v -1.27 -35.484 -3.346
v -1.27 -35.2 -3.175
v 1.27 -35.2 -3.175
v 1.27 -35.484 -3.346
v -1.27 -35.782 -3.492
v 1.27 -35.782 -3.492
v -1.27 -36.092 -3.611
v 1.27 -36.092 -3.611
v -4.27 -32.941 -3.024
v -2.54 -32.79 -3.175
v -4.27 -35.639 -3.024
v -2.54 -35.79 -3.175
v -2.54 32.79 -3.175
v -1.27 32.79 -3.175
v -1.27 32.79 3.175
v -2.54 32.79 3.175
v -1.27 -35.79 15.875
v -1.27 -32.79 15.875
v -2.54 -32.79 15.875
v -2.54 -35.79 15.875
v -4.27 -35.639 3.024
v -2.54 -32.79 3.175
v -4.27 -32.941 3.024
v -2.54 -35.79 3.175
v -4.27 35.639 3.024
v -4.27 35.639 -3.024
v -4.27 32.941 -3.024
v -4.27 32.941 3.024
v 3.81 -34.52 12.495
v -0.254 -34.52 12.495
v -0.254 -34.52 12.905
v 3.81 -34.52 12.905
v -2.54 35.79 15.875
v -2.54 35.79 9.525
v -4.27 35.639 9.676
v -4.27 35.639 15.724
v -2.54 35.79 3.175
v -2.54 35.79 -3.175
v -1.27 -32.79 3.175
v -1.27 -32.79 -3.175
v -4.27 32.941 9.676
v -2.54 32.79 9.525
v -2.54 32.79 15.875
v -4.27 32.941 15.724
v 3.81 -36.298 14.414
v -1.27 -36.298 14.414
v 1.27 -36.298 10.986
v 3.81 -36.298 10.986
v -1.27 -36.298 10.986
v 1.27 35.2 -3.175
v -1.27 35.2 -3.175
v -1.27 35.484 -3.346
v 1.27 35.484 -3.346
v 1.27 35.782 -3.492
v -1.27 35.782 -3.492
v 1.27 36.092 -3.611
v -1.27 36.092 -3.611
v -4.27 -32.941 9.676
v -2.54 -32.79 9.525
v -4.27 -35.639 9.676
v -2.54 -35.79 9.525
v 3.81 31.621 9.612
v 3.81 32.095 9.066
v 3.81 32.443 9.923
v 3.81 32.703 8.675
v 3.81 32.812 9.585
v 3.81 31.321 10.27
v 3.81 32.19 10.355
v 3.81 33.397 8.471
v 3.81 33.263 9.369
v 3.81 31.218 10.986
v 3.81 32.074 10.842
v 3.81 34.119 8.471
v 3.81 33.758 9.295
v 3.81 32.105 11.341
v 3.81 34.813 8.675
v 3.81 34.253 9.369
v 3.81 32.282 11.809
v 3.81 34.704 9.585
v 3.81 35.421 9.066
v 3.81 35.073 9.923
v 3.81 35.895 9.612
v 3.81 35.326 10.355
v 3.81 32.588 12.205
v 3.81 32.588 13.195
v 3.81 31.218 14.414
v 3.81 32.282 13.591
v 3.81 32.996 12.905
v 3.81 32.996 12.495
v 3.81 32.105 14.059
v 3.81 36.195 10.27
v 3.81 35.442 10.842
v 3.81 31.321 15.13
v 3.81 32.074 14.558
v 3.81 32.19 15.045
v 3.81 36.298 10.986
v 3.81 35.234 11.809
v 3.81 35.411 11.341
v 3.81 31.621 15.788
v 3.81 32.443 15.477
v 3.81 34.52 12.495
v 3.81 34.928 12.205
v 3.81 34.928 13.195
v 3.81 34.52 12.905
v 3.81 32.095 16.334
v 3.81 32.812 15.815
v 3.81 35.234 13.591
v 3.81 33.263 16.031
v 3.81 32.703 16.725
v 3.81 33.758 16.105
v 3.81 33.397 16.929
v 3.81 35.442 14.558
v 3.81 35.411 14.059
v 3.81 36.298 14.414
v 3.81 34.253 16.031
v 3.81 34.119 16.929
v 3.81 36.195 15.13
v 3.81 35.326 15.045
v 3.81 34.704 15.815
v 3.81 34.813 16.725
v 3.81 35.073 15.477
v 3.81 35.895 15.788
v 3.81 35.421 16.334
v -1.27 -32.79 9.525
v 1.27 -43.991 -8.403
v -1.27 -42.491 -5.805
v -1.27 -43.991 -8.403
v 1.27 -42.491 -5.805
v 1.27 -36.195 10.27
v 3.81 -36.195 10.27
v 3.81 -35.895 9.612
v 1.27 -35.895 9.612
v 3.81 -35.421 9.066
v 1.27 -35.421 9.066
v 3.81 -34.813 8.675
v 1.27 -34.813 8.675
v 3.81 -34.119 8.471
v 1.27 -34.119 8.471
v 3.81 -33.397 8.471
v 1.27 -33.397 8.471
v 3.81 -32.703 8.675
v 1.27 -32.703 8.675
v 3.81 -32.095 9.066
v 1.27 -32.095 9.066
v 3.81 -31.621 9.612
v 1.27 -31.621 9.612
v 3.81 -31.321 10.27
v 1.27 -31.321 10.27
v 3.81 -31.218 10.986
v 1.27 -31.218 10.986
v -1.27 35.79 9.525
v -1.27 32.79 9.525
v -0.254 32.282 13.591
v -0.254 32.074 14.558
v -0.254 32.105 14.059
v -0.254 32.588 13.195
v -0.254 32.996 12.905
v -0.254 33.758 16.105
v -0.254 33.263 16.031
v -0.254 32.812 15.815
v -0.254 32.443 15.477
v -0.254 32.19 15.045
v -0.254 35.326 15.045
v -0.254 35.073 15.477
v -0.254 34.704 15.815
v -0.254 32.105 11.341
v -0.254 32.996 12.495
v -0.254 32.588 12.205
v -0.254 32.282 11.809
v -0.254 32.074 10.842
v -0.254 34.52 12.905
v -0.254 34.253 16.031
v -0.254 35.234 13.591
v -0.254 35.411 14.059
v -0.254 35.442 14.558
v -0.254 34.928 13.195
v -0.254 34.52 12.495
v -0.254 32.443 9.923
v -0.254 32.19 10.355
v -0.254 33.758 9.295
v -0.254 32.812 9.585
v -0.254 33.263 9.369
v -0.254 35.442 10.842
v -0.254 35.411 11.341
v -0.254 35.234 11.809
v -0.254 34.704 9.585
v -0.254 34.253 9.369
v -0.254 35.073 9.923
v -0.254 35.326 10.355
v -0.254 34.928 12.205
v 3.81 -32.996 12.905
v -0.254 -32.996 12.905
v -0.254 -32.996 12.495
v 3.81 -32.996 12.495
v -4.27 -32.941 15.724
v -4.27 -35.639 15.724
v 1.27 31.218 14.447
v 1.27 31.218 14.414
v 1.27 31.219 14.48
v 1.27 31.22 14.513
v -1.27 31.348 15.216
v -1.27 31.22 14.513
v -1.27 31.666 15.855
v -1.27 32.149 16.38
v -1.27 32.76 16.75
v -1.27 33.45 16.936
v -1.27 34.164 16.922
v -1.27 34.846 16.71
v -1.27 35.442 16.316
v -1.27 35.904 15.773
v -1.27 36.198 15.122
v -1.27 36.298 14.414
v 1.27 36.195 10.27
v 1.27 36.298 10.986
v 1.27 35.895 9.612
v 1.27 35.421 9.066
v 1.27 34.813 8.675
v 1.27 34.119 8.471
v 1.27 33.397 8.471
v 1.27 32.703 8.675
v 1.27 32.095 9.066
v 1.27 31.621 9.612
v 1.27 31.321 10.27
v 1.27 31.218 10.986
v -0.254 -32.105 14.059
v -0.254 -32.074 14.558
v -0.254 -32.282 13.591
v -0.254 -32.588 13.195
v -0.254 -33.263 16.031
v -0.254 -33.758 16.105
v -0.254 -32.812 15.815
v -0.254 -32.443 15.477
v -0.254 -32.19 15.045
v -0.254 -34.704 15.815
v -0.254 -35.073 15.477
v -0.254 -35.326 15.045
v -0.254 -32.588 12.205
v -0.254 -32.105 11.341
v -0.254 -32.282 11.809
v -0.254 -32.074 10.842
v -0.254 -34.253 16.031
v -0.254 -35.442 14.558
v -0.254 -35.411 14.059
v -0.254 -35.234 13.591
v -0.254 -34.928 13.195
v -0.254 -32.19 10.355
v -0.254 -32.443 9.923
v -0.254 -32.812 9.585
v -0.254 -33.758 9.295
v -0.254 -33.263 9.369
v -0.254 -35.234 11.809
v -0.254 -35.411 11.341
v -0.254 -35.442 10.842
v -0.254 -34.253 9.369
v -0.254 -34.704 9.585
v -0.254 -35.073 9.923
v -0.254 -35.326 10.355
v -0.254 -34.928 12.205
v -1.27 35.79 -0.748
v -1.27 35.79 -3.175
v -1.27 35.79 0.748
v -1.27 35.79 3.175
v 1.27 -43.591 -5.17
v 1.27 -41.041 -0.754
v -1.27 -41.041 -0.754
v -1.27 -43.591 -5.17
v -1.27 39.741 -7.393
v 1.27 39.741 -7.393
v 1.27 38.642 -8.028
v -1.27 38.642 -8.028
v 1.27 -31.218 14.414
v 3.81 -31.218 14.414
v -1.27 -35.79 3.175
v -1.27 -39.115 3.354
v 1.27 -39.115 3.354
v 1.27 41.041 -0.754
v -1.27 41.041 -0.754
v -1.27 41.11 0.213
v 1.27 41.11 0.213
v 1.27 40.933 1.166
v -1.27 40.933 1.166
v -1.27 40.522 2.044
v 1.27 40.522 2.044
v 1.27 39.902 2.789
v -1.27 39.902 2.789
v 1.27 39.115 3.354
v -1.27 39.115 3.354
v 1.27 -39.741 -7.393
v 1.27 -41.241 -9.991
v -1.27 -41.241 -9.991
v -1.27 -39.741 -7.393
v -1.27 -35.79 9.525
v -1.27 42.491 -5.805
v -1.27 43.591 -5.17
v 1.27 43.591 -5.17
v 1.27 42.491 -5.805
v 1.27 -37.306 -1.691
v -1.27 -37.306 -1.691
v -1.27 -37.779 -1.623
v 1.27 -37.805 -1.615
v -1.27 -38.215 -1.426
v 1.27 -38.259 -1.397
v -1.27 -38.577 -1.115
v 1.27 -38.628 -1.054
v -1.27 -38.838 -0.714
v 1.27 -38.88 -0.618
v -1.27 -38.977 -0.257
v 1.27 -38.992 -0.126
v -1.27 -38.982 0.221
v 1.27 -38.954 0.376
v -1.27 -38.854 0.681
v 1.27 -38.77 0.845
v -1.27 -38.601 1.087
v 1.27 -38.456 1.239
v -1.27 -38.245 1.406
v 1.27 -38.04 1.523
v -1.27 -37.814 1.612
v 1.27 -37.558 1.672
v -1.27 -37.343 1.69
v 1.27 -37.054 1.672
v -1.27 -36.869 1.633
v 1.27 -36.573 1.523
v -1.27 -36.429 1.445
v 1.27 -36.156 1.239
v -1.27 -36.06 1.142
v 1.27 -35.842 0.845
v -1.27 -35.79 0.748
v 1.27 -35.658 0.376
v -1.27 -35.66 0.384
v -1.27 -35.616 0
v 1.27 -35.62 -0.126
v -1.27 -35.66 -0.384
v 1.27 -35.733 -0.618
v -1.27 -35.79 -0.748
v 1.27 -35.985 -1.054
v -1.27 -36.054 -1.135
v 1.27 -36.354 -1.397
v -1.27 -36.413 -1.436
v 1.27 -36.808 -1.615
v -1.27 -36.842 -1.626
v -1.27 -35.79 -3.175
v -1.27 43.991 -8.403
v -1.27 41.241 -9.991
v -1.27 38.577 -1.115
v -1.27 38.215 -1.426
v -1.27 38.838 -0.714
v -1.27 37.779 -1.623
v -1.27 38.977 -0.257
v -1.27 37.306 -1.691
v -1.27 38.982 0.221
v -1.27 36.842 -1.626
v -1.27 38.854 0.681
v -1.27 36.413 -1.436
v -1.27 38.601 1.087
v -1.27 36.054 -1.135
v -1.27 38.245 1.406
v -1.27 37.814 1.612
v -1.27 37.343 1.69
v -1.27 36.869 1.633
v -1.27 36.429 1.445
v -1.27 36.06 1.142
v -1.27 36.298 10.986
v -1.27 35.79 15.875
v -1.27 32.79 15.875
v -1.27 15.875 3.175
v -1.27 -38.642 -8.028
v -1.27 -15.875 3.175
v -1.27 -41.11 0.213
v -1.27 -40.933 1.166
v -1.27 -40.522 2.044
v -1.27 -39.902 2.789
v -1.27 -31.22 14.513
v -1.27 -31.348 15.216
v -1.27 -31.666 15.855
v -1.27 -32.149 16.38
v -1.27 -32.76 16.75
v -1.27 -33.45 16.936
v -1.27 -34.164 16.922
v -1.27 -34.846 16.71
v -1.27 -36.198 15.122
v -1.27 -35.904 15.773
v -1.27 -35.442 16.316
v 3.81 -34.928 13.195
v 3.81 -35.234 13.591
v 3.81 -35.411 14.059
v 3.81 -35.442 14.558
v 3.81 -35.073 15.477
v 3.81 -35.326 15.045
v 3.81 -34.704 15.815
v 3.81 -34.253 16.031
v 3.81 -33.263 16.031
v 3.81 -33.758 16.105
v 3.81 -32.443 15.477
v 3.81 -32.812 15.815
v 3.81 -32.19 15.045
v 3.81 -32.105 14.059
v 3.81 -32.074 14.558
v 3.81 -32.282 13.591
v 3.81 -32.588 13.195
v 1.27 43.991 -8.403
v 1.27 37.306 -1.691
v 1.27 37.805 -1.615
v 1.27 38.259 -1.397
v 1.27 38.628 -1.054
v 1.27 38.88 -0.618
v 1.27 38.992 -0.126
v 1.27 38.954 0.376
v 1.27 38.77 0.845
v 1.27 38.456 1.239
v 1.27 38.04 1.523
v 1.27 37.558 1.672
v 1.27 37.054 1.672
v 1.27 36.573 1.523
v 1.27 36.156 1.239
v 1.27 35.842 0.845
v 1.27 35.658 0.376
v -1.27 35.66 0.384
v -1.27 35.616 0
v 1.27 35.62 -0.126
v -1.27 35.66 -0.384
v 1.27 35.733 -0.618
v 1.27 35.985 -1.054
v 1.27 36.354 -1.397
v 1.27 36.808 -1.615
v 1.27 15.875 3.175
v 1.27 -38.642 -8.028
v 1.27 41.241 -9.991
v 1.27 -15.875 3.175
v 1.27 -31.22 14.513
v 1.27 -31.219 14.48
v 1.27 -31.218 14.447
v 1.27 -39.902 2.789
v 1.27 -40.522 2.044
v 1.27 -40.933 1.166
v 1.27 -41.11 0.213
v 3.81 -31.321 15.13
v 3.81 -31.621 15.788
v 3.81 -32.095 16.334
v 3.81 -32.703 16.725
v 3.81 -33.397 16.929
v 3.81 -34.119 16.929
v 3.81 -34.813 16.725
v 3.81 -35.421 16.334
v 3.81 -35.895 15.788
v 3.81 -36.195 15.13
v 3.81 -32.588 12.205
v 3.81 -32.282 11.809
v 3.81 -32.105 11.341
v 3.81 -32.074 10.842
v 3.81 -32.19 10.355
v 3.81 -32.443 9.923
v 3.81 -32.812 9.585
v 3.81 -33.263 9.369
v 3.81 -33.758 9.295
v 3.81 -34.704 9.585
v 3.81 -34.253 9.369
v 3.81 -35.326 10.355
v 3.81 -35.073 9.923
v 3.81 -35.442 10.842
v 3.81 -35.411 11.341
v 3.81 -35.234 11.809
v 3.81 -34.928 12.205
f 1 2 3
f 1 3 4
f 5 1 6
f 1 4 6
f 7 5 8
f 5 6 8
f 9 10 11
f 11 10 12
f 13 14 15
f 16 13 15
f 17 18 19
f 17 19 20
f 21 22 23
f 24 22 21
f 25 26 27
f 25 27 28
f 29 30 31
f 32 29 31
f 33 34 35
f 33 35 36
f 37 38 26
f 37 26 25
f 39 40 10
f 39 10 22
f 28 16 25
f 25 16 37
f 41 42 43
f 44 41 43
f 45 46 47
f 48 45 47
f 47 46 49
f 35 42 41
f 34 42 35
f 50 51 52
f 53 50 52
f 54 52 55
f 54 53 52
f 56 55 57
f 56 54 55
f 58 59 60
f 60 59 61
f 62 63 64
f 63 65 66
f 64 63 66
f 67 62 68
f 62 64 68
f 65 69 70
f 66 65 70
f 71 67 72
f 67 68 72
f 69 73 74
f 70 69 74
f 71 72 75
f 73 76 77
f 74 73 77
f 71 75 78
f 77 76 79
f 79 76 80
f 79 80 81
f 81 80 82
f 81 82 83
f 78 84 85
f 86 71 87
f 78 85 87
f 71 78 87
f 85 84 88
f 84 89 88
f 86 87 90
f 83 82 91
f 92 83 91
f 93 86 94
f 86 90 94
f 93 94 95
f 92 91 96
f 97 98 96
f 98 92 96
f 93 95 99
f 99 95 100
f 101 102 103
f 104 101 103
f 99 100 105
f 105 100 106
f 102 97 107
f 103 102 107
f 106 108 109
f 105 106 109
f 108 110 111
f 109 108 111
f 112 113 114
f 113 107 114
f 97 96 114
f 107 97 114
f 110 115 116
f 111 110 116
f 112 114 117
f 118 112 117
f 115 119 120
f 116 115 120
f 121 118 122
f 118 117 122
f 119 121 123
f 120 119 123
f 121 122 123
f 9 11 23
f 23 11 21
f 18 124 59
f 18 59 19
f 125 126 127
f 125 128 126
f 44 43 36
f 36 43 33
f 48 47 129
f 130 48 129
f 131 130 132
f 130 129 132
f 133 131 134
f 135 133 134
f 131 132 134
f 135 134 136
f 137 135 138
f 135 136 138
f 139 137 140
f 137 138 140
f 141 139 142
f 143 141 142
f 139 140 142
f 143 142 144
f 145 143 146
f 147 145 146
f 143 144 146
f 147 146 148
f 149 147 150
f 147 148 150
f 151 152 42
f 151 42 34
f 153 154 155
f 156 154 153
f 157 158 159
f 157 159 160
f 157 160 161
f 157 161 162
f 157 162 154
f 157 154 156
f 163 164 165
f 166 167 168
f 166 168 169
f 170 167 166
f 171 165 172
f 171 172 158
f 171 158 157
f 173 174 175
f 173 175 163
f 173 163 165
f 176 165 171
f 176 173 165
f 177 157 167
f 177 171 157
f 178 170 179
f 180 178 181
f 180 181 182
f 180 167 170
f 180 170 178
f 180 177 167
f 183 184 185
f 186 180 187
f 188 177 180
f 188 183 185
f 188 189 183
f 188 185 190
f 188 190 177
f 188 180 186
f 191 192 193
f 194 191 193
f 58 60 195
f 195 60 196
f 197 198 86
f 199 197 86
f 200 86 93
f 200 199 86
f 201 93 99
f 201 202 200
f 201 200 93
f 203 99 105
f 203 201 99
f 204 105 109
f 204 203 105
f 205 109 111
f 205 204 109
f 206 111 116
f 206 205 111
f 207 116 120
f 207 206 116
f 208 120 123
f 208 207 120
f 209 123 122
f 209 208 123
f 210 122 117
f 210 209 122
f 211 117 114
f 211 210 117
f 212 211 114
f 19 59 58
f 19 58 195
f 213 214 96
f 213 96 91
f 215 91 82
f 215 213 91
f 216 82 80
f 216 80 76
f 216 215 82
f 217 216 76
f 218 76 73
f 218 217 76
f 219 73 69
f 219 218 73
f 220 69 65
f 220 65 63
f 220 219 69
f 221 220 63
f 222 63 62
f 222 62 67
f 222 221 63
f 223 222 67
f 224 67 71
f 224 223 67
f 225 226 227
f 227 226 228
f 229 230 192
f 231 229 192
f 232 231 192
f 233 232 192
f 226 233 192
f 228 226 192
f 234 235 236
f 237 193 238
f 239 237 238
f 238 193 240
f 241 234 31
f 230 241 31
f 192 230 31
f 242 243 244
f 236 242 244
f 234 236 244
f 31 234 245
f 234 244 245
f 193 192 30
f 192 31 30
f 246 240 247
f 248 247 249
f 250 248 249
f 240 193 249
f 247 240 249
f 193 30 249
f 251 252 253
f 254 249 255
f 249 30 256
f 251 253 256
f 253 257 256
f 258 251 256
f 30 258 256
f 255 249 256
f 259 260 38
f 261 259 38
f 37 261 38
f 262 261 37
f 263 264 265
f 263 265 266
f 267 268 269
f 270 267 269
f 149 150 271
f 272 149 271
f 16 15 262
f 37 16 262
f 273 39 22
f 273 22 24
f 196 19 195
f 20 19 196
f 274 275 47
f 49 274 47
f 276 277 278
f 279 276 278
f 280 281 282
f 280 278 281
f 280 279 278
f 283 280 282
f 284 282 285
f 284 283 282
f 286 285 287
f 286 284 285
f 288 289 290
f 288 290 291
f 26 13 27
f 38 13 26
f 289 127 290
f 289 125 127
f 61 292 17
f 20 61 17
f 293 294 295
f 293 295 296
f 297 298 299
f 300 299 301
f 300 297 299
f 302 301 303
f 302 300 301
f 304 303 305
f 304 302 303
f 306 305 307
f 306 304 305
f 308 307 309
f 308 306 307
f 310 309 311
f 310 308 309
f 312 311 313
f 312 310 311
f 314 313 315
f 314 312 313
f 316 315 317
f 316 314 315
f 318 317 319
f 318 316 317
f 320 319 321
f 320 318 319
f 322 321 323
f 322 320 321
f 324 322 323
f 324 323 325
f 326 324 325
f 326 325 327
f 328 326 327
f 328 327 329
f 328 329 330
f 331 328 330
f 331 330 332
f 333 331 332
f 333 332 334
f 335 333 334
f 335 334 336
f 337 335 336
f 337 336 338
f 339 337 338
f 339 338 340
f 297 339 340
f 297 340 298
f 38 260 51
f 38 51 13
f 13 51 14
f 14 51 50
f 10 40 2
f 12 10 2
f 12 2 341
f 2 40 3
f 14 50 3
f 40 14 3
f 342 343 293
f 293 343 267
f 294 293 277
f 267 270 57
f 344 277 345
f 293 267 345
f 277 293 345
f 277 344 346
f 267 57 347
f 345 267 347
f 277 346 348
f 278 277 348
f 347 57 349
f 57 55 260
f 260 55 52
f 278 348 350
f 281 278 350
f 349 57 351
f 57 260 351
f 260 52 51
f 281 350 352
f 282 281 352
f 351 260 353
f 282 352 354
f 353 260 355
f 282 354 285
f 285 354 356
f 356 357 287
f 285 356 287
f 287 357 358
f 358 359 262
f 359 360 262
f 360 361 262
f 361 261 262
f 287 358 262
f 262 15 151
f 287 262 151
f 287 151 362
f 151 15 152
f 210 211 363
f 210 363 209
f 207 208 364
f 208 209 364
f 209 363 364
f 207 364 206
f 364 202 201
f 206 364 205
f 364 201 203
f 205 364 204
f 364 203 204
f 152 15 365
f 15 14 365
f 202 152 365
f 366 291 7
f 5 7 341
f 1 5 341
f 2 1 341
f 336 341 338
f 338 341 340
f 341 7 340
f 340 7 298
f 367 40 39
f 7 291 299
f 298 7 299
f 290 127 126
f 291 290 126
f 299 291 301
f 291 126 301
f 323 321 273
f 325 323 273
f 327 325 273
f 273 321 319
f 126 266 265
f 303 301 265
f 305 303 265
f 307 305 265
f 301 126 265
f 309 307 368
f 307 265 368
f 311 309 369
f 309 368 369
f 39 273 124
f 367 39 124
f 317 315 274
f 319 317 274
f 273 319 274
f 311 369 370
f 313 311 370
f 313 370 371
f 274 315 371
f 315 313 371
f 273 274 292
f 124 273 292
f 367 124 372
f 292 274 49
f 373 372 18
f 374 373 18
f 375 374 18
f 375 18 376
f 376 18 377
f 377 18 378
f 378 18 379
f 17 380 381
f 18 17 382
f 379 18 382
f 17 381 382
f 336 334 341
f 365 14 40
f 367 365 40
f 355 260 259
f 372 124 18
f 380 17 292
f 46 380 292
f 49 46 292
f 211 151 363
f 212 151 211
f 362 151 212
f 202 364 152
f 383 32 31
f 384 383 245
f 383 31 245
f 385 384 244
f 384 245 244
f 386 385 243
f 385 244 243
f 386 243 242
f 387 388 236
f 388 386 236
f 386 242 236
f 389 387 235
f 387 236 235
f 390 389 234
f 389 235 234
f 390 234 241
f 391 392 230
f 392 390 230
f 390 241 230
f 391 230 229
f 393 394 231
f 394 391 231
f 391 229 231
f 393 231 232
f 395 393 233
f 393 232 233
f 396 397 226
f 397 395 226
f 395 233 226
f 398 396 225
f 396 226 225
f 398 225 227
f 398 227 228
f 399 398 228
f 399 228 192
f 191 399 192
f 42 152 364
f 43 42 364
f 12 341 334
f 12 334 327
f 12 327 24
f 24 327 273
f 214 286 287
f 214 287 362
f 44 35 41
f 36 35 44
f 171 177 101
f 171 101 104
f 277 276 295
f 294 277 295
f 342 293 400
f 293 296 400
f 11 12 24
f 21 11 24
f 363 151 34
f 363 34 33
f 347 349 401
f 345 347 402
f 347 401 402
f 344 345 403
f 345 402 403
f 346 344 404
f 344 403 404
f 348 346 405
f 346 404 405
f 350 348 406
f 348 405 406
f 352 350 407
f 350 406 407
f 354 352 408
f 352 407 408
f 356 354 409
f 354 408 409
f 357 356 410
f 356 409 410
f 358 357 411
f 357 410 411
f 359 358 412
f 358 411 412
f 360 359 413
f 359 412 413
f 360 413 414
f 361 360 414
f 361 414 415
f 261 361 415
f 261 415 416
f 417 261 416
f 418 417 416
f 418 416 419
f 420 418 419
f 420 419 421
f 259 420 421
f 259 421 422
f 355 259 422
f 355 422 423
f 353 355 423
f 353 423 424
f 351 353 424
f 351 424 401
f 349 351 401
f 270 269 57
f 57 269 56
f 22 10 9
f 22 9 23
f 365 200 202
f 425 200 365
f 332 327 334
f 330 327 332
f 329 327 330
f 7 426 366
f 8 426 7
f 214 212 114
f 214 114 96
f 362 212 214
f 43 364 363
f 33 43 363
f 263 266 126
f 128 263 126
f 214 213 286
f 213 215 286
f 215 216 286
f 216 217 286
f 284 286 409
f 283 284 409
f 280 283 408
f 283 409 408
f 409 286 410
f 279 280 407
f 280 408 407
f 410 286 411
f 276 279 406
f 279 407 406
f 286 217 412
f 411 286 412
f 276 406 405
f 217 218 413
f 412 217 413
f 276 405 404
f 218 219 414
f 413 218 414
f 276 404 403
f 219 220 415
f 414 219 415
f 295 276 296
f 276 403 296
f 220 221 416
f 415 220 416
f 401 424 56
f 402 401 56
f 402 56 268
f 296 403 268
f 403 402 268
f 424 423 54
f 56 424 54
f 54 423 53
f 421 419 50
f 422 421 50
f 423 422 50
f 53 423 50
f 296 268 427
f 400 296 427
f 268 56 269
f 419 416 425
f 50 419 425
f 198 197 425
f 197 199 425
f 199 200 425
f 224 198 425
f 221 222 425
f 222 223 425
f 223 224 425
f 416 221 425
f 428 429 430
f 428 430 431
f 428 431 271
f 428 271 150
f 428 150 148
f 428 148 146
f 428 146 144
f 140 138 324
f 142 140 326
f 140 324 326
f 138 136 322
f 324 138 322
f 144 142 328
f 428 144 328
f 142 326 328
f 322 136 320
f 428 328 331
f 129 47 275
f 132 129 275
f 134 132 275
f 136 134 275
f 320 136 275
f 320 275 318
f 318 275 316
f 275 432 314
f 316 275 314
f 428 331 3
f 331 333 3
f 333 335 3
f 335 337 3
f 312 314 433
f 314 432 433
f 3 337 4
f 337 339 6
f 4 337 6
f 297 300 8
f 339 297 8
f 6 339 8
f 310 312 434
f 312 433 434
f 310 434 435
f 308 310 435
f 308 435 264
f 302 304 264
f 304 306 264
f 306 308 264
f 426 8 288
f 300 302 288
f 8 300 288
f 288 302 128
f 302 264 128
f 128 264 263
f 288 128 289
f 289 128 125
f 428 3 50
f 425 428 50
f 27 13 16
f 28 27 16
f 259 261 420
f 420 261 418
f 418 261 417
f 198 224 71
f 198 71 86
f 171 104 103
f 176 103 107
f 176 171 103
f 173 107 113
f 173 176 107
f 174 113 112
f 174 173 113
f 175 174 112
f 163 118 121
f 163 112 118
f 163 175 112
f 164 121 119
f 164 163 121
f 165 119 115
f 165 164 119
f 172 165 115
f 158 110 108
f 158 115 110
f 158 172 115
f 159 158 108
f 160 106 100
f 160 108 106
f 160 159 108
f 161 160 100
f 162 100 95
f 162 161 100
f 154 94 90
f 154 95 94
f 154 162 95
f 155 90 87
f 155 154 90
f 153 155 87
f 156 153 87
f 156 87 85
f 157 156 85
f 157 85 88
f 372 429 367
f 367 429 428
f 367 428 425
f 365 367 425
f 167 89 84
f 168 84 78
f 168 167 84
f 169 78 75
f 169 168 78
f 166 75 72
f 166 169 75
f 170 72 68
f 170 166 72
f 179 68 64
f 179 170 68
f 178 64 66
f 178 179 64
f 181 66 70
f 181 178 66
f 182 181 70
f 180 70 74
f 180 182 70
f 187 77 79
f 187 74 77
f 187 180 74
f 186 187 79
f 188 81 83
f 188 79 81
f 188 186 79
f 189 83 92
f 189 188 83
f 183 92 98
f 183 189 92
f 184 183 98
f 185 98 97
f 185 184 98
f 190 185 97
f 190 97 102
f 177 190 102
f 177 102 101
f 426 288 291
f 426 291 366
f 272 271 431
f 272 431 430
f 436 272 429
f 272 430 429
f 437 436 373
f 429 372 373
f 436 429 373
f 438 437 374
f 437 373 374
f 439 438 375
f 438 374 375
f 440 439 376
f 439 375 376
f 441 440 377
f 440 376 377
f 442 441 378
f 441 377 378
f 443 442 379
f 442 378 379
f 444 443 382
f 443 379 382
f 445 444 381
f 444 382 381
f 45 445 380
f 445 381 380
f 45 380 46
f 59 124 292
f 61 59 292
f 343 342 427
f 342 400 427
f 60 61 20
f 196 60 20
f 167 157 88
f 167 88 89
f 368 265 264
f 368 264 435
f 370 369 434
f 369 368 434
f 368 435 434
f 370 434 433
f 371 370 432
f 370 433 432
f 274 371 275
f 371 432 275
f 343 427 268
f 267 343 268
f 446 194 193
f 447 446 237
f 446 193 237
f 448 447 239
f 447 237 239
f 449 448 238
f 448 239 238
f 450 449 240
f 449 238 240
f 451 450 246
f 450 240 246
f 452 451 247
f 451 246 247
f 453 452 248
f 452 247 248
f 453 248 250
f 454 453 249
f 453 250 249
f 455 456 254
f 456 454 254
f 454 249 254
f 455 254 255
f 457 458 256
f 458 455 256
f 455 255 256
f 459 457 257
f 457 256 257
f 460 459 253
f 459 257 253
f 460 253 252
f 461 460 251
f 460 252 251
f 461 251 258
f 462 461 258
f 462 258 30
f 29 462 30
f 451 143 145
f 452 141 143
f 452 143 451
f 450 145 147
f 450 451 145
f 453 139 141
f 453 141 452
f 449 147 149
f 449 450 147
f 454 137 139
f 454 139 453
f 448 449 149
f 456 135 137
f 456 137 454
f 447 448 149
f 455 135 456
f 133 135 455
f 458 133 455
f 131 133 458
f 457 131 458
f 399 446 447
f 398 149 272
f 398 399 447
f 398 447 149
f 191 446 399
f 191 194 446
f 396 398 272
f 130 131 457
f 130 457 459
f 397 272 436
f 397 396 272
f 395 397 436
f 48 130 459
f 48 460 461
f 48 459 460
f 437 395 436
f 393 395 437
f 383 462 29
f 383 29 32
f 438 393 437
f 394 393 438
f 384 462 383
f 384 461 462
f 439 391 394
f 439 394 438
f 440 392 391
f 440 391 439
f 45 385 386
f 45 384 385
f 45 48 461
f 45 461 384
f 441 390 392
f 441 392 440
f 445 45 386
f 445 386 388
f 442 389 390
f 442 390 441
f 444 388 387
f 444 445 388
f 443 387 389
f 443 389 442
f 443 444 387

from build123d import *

# Parameters (mm, degrees)
SKETCH3_R                   = 3.81
DOWELSUPPORT_DEPTH          = 1.27
SKETCH5_W                   = 6.35
SKETCH5_H                   = 44.45
SLIDERDOWELSUPPORT_DEPTH    = 1.27
LATERALSUPPORT_DEPTH        = 1.27
SKETCH8_W                   = 6.35
SKETCH8_H                   = 3
TABSUPPORT_DEPTH            = 1.27
STRINGDOWELSUPPORT_START    = -1.27
STRINGDOWELSUPPORT_DEPTH    = 5.08
INTERSUPPORT_DEPTH          = 1.27
SKETCH10_W                  = 6.35
SKETCH10_H                  = 3
TABBASE_DEPTH               = 1.27
SKETCH12_W                  = 6.35
SKETCH12_H                  = 3
TABDRAFT_DEPTH              = 1.73
TABDRAFT_DRAFT              = 5
TABDRAFT_PROFILE_2_DEPTH    = 1.73
TABDRAFT_PROFILE_2_DRAFT    = 5
STRINGDOWELHOLES_DEPTH      = 48.469574456
STRINGDOWELHOLES_DEPTH_BACK = 1.524
SKETCH14_R                  = 1.690500048
PULLEYDOWELHOLE_DEPTH       = 2.54


with BuildPart() as part:
    # Sketch3 → DowelSupport (new, symmetric)
    with BuildSketch(Plane(origin=(0, 0, 0), x_dir=(0, 0, -1), z_dir=(1, 0, 0))):
        with Locations((0, 37.30625)):
            Circle(SKETCH3_R)
    extrude(amount=DOWELSUPPORT_DEPTH, both=True)

    # Sketch8 → TabSupport (add, symmetric)
    with BuildSketch(Plane(origin=(0, 0, 0), x_dir=(0, 0, -1), z_dir=(1, 0, 0))):
        with Locations((0, 34.29)):
            Rectangle(SKETCH8_W, SKETCH8_H)
        with Locations((-12.7, 34.29)):
            Rectangle(SKETCH8_W, SKETCH8_H)
    extrude(amount=TABSUPPORT_DEPTH, both=True)


with BuildPart() as body_2:
    # Sketch5 → SliderDowelSupport (new, symmetric)
    with BuildSketch(Plane(origin=(0, 0, 0), x_dir=(0, 0, -1), z_dir=(1, 0, 0))):
        Rectangle(SKETCH5_W, SKETCH5_H)
    extrude(amount=SLIDERDOWELSUPPORT_DEPTH, both=True)



with BuildPart() as body_3:
    # Sketch6 → LateralSupport (new, symmetric)
    with BuildSketch(Plane(origin=(0, 0, 0), x_dir=(0, 0, -1), z_dir=(1, 0, 0))):
        Polygon((7.392863577, 39.741434671), (5.805363577, 42.491065329), (8.403439788, 43.991065329), (9.990939788, 41.241434671), align=None)
    extrude(amount=LATERALSUPPORT_DEPTH, both=True)


with BuildPart() as tabsupport_piece_1:
    # of the separate pieces the step leaves, piece 1, a body of its own (tabsupport_pieces)
    add(part.part.solids().sort_by_distance((1.27, 35.200193258, 3.175))[0])


with BuildPart() as tabsupport_piece_2:
    # of the separate pieces the step leaves, piece 2, a body of its own (tabsupport_pieces)
    add(part.part.solids().sort_by_distance((-1.27, 32.79, 9.525))[0])

    # Sketch15 → StringDowelSupport (add)
    with BuildSketch(Plane(origin=(0, 0, 0), x_dir=(0, 0, -1), z_dir=(1, 0, 0)).offset(STRINGDOWELSUPPORT_START)):
        with BuildLine():
            Line((-14.4145, 36.298), (-10.9855, 36.298))
            ThreePointArc((-10.9855, 36.298), (-8.4455, 33.758), (-10.9855, 31.218))
            Line((-10.9855, 31.218), (-14.4145, 31.218))
            ThreePointArc((-14.4145, 31.218), (-16.9545, 33.758), (-14.4145, 36.298))
        make_face()
    extrude(amount=STRINGDOWELSUPPORT_DEPTH)


with BuildPart() as body_2_1:
    add(body_2.part)

    add(body_3.part)  # InterSupport merges body 3

    add(tabsupport_piece_1.part)  # InterSupport merges TabSupport piece 1

    add(tabsupport_piece_2.part)  # InterSupport merges TabSupport piece 2
    # Sketch7 → InterSupport (add, symmetric)
    with BuildSketch(Plane(origin=(0, 0, 0), x_dir=(0, 0, -1), z_dir=(1, 0, 0))):
        Polygon((-15.691284512, 32.81461378), (-3.175, 15.875), (-3.175, 22.225), (3.175, 22.225), (3.175, 32.79), (0.989321966, 34.625476176), (-0.989321966, 39.987023824), (-10.9855, 36.298), (-14.4145, 36.298), align=None)
        Polygon((5.170363577, 43.590917591), (8.027863577, 38.641582409), (1.42875, 34.831582409), (-1.42875, 39.780917591), align=None)
    extrude(amount=INTERSUPPORT_DEPTH, both=True)

    # Sketch10 → TabBase (add)
    with BuildSketch(Plane.ZY.offset(1.27)):
        with Locations((0, 34.29)):
            Rectangle(SKETCH10_W, SKETCH10_H)
        with Locations((12.7, 34.29)):
            Rectangle(SKETCH10_W, SKETCH10_H)
    extrude(amount=TABBASE_DEPTH)


with BuildPart() as tabdraft_tool:
    # Sketch12 → TabDraft (with draft: the straight prism first)
    with BuildSketch(Plane.ZY.offset(2.54)):
        with Locations((0, 34.29)):
            Rectangle(SKETCH12_W, SKETCH12_H)
    extrude(amount=TABDRAFT_DEPTH)
    # TabDraft: the draft: its side faces are tilted about the plane it starts from
    tabdraft_sides = [tabdraft_tool.faces().sort_by_distance(p)[0] for p in [
        (-3.405, 34.29, 3.175),
        (-3.405, 35.79, 0),
        (-3.405, 34.29, -3.175),
        (-3.405, 32.79, 0),
    ]]
    draft(tabdraft_sides, Plane.ZY.offset(2.54), TABDRAFT_DRAFT)


with BuildPart() as body_2_2:
    add(body_2_1.part)

    # TabDraft: add tabdraft_tool
    add(tabdraft_tool.part)


with BuildPart() as tabdraft_profile_2_tool:
    # Sketch12 → TabDraft profile 2 (with draft: the straight prism first)
    with BuildSketch(Plane.ZY.offset(2.54)):
        with Locations((12.7, 34.29)):
            Rectangle(SKETCH12_W, SKETCH12_H)
    extrude(amount=TABDRAFT_PROFILE_2_DEPTH)
    # TabDraft profile 2: the draft: its side faces are tilted about the plane it starts from
    tabdraft_profile_2_sides = [tabdraft_profile_2_tool.faces().sort_by_distance(p)[0] for p in [
        (-3.405, 34.29, 9.525),
        (-3.405, 32.79, 12.7),
        (-3.405, 34.29, 15.875),
        (-3.405, 35.79, 12.7),
    ]]
    draft(tabdraft_profile_2_sides, Plane.ZY.offset(2.54), TABDRAFT_PROFILE_2_DRAFT)


with BuildPart() as body_2_3:
    add(body_2_2.part)

    # TabDraft profile 2: add tabdraft_profile_2_tool
    add(tabdraft_profile_2_tool.part)

    # Sketch16 → StringDowelHoles (cut, two sides: drawn at the far end of the back side and taken through both)
    with BuildSketch(Plane(origin=(1.27, 0, 0), x_dir=(0, 0, -1), z_dir=(1, 0, 0)).offset(-STRINGDOWELHOLES_DEPTH_BACK)):
        with BuildLine():
            Line((-12.905478326, 32.996), (-12.494521674, 32.996))
            ThreePointArc((-12.494521674, 32.996), (-9.294999952, 33.758), (-12.494521674, 34.52))
            Line((-12.494521674, 34.52), (-12.905478326, 34.52))
            ThreePointArc((-12.905478326, 34.52), (-16.105000048, 33.758), (-12.905478326, 32.996))
        make_face()
    extrude(amount=STRINGDOWELHOLES_DEPTH + STRINGDOWELHOLES_DEPTH_BACK, mode=Mode.SUBTRACT)

    # Sketch14 → PulleyDowelHole (cut)
    with BuildSketch(Plane(origin=(1.27, 0, 0), x_dir=(0, 0, -1), z_dir=(1, 0, 0))):
        with Locations((0, 37.30625)):
            Circle(SKETCH14_R)
    extrude(amount=-PULLEYDOWELHOLE_DEPTH, mode=Mode.SUBTRACT)

    # Mirror1: body 2 across plane


with BuildPart() as body_2_4:
    add(body_2_3.part)
    add(body_2_3.part.mirror(Plane.ZX))


solid = body_2_4.part
